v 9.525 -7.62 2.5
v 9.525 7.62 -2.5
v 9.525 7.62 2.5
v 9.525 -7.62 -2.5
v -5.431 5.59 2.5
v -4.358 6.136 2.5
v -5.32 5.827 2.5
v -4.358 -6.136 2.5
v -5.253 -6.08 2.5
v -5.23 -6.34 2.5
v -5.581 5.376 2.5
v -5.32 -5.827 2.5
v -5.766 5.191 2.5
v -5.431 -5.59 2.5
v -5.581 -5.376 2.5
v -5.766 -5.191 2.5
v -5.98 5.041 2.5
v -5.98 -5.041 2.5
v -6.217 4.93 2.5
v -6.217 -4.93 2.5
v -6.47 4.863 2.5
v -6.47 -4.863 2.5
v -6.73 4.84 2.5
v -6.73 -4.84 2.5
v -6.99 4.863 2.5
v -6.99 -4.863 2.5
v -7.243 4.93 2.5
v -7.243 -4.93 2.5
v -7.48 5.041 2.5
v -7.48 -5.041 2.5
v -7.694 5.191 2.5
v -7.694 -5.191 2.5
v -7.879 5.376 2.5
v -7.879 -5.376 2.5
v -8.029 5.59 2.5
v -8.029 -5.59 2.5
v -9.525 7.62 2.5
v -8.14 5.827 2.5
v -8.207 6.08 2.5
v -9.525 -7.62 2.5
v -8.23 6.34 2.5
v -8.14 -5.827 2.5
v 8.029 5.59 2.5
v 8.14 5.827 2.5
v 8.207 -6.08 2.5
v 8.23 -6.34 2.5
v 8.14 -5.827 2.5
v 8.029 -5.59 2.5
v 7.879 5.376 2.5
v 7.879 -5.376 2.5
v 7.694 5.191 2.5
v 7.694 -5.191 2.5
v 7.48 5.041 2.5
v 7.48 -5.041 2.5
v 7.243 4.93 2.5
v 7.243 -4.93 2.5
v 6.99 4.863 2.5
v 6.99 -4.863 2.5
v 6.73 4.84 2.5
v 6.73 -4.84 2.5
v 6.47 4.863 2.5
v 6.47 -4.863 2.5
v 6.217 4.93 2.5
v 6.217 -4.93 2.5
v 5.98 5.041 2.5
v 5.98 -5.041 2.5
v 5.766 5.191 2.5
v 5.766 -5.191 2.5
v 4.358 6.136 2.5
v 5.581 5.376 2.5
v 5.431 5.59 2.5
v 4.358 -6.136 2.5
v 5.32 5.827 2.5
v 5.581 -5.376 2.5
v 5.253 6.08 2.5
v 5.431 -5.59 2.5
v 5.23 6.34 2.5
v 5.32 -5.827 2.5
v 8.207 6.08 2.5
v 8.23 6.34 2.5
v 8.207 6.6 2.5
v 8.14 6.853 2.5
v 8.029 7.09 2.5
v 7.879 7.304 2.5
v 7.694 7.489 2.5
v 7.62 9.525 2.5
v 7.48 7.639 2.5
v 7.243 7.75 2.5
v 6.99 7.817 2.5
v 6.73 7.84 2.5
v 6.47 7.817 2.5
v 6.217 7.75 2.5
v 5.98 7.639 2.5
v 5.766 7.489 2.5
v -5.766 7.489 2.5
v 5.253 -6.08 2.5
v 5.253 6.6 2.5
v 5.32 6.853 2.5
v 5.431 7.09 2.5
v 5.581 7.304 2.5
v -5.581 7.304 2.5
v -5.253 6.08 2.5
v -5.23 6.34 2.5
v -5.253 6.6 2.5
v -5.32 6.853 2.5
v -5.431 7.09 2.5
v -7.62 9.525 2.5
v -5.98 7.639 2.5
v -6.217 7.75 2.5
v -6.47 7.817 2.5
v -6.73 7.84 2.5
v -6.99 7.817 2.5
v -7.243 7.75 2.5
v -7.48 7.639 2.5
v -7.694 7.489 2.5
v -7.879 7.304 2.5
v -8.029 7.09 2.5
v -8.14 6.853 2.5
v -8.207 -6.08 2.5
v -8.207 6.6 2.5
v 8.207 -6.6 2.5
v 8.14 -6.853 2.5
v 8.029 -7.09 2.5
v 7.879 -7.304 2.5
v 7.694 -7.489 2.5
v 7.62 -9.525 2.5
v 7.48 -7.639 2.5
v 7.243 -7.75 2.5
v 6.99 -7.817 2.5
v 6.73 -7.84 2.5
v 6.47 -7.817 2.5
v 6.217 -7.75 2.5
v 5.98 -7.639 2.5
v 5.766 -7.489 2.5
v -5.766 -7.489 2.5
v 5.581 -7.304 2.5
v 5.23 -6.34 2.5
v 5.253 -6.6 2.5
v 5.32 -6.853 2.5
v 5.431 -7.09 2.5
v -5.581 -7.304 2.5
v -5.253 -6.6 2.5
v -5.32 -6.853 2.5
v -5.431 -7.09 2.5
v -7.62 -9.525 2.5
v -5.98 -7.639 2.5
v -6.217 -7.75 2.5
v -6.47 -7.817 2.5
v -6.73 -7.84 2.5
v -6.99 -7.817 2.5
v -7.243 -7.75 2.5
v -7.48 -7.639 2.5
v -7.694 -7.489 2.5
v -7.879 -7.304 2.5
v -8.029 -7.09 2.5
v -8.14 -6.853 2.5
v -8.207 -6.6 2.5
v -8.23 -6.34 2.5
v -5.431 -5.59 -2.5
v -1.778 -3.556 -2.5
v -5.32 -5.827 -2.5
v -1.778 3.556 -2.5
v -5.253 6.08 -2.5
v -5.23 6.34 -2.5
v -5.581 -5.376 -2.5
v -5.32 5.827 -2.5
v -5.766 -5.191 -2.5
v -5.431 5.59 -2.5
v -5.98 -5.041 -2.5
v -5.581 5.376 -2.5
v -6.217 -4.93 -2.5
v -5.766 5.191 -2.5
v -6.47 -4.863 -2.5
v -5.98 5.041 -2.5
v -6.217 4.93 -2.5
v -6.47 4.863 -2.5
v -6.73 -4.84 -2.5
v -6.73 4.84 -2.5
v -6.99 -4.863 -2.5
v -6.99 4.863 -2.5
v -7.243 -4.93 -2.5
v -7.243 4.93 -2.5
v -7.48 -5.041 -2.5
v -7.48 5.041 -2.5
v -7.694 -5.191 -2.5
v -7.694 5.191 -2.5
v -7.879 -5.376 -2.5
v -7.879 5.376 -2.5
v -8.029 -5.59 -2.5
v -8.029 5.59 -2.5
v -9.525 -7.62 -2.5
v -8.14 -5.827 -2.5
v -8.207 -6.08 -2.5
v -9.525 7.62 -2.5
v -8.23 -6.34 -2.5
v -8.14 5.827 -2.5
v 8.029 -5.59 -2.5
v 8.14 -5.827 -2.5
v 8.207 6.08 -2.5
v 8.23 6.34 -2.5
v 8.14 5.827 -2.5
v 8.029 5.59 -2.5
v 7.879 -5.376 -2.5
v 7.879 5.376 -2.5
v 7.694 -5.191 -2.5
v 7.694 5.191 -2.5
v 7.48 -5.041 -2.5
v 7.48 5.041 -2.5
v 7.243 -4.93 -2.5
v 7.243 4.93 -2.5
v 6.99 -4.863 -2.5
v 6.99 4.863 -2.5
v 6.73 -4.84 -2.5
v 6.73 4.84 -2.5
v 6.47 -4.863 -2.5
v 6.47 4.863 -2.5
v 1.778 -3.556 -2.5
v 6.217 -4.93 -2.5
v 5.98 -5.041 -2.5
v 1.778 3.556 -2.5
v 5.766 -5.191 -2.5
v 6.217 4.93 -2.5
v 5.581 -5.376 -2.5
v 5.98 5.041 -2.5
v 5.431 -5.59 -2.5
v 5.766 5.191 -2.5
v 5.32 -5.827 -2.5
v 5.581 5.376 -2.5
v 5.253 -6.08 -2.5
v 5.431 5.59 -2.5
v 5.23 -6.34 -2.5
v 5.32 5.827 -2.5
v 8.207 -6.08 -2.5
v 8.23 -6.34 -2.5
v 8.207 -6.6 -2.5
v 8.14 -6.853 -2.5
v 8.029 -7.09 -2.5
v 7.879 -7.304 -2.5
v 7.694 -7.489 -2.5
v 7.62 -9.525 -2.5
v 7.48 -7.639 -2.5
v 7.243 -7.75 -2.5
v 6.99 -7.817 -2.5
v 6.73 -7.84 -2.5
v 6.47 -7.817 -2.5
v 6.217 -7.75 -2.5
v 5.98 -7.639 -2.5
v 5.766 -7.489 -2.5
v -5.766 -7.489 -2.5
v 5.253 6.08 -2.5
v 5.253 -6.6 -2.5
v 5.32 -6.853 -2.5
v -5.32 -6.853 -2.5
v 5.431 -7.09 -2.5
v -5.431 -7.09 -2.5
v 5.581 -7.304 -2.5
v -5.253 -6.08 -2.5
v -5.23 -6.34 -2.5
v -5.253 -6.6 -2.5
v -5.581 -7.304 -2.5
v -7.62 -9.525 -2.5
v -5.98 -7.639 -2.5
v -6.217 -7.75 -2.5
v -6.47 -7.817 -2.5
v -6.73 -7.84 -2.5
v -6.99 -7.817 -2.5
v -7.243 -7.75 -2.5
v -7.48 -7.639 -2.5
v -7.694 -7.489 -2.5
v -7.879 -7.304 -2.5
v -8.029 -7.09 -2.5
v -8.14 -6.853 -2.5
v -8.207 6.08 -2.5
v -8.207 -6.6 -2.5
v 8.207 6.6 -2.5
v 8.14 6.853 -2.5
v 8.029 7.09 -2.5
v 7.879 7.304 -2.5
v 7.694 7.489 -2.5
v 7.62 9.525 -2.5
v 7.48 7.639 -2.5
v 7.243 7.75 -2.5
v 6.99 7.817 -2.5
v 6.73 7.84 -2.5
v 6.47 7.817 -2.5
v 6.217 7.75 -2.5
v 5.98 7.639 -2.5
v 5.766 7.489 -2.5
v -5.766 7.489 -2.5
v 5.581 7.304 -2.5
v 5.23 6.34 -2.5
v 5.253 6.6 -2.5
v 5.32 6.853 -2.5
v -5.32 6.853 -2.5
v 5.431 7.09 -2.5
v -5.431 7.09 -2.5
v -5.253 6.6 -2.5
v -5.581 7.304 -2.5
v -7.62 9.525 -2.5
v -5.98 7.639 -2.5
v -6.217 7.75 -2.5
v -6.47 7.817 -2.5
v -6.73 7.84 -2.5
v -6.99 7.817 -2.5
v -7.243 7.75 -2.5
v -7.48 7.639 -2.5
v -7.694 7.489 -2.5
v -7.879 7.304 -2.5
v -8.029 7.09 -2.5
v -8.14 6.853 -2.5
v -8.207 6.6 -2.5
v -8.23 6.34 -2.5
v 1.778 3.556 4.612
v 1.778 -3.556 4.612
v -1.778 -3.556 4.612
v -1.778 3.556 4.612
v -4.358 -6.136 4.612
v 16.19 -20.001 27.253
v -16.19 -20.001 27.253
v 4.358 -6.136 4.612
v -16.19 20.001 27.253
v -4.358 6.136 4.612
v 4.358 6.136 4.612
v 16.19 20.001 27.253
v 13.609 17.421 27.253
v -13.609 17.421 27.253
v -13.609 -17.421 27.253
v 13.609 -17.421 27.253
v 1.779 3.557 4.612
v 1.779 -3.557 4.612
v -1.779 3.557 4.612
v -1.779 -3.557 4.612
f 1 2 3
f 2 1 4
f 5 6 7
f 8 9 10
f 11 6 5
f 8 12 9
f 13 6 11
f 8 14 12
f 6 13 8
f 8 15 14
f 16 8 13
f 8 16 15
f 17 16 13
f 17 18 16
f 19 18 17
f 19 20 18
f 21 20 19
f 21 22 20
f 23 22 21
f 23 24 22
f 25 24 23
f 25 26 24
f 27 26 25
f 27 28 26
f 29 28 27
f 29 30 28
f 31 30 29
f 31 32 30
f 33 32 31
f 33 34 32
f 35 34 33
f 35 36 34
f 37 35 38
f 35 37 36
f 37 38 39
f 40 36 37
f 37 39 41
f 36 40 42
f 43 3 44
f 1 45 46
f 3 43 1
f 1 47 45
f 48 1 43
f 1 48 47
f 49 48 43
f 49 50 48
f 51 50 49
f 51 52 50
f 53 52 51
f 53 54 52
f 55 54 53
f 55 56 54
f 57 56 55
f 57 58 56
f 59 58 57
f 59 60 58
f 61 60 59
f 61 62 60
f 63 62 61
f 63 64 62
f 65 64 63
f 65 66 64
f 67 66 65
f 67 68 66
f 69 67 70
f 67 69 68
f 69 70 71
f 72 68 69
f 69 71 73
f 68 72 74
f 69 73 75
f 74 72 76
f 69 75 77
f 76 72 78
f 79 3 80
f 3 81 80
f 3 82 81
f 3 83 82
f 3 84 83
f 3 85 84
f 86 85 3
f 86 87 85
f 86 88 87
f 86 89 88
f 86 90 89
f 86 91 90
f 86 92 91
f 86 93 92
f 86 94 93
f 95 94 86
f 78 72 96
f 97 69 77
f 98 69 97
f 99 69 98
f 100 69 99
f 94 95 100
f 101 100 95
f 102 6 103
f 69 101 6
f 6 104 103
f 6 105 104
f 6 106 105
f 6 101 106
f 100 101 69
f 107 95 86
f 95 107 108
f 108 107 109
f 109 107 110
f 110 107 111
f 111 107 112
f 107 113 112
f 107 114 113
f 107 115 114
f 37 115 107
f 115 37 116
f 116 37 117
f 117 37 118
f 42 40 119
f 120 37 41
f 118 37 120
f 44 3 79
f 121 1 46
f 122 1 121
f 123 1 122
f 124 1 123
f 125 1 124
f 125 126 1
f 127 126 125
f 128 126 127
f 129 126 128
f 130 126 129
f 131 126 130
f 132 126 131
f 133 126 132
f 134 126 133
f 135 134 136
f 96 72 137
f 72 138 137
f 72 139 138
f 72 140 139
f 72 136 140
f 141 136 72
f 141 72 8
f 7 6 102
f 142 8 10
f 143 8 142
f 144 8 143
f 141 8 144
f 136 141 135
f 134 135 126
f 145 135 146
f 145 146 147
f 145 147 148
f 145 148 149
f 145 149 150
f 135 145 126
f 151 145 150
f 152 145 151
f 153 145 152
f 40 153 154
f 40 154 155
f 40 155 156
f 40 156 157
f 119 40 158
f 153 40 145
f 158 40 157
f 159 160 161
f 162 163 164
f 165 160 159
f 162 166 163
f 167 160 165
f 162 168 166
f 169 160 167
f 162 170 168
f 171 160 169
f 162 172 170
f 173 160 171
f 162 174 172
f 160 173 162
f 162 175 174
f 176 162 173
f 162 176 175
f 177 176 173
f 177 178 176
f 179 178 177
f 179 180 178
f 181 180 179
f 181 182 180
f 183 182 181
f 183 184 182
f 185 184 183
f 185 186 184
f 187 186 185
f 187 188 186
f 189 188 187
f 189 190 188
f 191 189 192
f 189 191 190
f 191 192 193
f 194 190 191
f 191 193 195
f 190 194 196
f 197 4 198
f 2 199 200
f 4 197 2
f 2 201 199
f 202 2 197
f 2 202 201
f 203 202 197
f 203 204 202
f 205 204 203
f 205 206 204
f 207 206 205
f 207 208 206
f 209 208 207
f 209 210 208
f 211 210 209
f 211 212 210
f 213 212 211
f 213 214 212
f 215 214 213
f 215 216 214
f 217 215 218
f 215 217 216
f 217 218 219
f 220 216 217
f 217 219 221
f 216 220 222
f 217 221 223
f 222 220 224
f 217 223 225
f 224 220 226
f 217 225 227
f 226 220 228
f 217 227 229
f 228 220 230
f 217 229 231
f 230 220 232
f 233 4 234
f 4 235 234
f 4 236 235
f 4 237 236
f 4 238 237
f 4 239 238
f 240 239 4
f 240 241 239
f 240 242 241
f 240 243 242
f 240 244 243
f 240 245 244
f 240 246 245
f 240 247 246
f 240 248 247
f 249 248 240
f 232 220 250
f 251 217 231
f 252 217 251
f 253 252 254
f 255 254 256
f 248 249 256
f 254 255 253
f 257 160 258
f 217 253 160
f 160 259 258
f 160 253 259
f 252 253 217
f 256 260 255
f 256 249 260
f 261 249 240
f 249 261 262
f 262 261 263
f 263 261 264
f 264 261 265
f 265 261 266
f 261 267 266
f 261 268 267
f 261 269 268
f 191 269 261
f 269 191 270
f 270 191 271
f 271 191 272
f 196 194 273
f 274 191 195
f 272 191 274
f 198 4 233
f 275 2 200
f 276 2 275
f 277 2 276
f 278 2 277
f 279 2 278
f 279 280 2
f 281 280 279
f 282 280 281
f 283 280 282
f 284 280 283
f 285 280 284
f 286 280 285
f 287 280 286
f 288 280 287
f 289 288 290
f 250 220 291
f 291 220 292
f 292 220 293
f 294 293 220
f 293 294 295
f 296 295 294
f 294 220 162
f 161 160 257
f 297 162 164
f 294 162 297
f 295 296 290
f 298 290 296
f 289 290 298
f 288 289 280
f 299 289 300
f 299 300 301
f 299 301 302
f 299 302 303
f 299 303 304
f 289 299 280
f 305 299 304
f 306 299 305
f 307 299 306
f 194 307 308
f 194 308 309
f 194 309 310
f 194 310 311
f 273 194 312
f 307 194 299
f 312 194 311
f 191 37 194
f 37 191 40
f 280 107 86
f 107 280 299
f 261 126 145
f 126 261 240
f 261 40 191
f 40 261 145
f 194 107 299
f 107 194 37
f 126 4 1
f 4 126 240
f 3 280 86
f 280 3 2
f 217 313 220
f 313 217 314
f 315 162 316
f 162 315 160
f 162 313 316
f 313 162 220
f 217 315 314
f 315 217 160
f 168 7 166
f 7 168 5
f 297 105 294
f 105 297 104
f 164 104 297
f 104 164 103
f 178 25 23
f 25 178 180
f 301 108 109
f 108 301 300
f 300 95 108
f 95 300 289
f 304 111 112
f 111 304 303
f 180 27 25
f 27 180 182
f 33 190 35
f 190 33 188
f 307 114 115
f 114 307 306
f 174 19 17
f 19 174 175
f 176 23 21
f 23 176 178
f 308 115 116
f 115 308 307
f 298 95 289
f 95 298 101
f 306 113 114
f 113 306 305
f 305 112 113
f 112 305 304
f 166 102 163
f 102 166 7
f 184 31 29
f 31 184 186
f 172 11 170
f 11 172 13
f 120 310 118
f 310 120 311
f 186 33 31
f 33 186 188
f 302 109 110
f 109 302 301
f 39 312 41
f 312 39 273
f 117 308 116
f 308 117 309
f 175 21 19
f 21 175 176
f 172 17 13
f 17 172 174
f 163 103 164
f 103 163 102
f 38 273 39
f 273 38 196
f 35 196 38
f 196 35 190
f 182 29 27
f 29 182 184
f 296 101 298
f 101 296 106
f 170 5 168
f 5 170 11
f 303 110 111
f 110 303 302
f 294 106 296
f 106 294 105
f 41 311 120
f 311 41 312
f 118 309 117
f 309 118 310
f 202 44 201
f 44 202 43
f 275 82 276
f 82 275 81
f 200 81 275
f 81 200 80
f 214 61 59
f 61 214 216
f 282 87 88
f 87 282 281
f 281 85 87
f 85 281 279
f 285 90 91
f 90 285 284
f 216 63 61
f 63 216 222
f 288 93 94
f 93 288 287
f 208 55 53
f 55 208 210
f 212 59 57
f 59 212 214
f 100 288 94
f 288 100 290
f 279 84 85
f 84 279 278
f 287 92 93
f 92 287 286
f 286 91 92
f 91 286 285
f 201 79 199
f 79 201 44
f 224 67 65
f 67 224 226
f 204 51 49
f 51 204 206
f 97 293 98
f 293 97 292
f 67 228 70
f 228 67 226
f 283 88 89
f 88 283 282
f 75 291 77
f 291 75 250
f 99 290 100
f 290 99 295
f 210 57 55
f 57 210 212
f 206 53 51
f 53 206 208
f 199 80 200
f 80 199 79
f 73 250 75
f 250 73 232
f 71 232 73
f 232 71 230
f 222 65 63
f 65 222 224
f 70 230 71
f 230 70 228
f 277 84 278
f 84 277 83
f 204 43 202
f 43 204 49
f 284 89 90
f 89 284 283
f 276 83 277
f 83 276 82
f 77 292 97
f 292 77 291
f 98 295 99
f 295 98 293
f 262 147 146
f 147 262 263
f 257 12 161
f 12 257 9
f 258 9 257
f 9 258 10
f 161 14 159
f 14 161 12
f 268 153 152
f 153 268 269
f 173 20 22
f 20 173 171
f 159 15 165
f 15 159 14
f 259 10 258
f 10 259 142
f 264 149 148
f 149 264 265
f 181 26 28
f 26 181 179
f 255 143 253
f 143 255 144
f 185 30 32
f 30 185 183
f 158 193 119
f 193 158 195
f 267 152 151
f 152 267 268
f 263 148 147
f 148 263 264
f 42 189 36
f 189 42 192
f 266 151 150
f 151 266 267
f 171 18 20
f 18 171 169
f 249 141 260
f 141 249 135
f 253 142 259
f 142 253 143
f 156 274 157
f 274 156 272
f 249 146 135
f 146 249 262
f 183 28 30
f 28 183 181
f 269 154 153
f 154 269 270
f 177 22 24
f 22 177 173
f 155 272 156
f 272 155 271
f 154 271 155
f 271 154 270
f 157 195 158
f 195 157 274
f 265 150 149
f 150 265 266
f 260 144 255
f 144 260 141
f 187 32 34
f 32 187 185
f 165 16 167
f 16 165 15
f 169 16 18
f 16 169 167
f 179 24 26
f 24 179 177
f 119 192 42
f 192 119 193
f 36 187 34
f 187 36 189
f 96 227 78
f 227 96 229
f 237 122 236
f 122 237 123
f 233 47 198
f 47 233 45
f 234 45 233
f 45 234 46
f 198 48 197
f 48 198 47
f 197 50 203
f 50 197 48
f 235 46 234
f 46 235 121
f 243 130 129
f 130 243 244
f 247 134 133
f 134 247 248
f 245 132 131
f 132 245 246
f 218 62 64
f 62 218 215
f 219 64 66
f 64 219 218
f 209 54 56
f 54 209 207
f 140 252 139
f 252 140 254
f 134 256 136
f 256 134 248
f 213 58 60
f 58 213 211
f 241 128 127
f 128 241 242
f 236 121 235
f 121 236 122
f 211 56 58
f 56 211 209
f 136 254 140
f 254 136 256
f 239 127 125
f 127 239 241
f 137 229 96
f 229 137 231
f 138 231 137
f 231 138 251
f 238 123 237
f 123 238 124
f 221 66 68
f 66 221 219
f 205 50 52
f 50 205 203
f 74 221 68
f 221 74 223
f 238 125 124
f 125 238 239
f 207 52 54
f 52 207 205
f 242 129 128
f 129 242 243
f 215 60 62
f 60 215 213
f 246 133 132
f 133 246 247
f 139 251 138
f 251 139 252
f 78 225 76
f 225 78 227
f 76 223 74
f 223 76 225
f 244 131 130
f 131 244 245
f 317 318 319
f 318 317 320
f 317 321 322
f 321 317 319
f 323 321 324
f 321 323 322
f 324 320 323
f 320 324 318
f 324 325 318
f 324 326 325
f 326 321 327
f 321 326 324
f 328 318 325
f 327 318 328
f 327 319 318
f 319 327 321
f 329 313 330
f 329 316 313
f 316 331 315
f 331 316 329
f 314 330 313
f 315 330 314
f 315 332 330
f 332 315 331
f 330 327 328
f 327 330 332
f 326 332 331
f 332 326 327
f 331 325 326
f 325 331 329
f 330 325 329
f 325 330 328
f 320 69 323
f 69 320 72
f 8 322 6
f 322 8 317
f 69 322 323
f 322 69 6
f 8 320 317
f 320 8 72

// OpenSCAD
// *************************************************************
// (C) 2013 Dipl.Ing. Rolf-Dieter Klein, Munich Germany
// OpenSource -- would be great to keep my name as reference
// HORN ANTENNA for Microwaves -- use copper to metallize
// or use for metal casting !!
// www.rdklein.de
// report error, problems to rdklein@rdklein.de
// *************************************************************
// WR Flange Code 
wrcode = 8; // [1:WR112,2:WR90,3:WR75,4:WR62,5:WR51,6:WR42,7:WR34,8:WR28]
//
// overall wall thickness in mm
wall = 2.58; // 
// flange thickness
flanged = 5; // flange thickness
//
// Antennalenght multiplier R0 = Lambda * n
multin = 2; // default 2Lambda

// addon in lamba/2 units flanged is subtracted ! !
waveadd = 1;  

// standard dimension tables
// WR cannot be entered directly due to openscad variable restrictions
// a case of if for assignment cannot be used, index is easier for this.
// WR 112 7.05-10.00 GHz
// WR 90  8.20-12.40 GHz
// WR 75  10.00-15.00 GHz
// WR 62  12.49-18.00 GHz
// WR 51  15.00-22.00 GHz
// WR 42  18.00-26.50 GHz
// WR 34  22.00-33.00 GHz
// WR 28  26.50-40.00 GHz
//
// do not change:
wrtab = [0,112,90,75,62,51,42,34,28]*1.0;
// do not change:
atab = [0,47.9,41.4,38.3,33.3,31.0,22.41,22.1,19.05]*1.0;
// do not change:
etab = [0,18.72,16.26,14.25,12.14,11.25,8.51,7.9,6.73]*1.0;
// do not change:
ftab = [0,17.17,15.49,13.21,12.63,10.29,8.13,7.5,6.34]*1.0;
// do not change:
drilltab=[0,4.3,4.3,4.1,4.1,4.1,3.1,3.1,3.0]*1.0;
// dann werte zuweisen
// ueber index
sizea = atab[wrcode]; // square size of flange
sizee = etab[wrcode]; // holes from smaller 
sizef = ftab[wrcode]; // holes from larger 
drill = drilltab[wrcode]/2.0; // drill for flange mounting
wr = wrtab[wrcode];
lquat = wr/20.0*2.54; // lamba 4 in mm
//

// faces for precision
$fn=36; // faces for precision
//
// *********** FLANGE ****************
// Draw A Flange with mounting holes
// now with separate thickness.
difference() {
 difference() {
 	intersection() {

		cube([sizea,sizea,flanged],center=true);
		rotate([0,0,45]) cube([sizea*1.4142*0.9,sizea*1.4142*0.9,flanged],center=true);
	}
	cube([lquat,lquat*2,wall*2],center=true);
 } 
 translate([-sizee,sizef,0]) cylinder(h=flanged*2,r=drill,center=true);
 translate([sizee,sizef,0]) cylinder(h=flanged*2,r=drill,center=true);
 translate([-sizee,-sizef,0]) cylinder(h=flanged*2,r=drill,center=true);
 translate([sizee,-sizef,0]) cylinder(h=flanged*2,r=drill,center=true);
}
//
// ***** HORN ANTENNA *****
// Pyramidal Horn
// r0 = length to pyramidal joint point
//
r0 = multin * lquat * 4; // lambda * 4 * multiplier for r0
Asize = sqrt(3*lquat*4*r0); // Size in H plane direction
//
// *** if preferred Bsize = sqrt(2*lquat*4*r0); // Size in E plane direction
//
a = lquat*2; // simpler for calc below
b = lquat;
// ********* rh and re now the base... one can be choosen
// optimal horn is for re=rh
// 
Bsize = 1/2*(b + sqrt(b*b+(8*Asize*(Asize-a)/3) ));
//
echo(r0);
echo(Asize);
//
lh = sqrt(r0*r0+(Asize*Asize)/4);
rh = Asize*( (Asize- a)/(3*lquat*4));

// rh = (Asize- a)*sqrt((lh/Asize)-1/4);
// le = sqrt(r0*r0+(Bsize*Bsize)/4);
// re = (Bsize- b)*sqrt((le/Bsize)-1/4);
// 
 
rh1 = rh * 1.00001; // for boolean problems to be solved
offset1 = -0.001+0.0;

// 
wa1= wall;
// wall thickness not alongside, but if needed:
// alpha = atan(Asize/(2*r0));
// wa1 = wall/cos(alpha);
// echo("alpha",alpha,"walpha=",wa1);
//
// Outer Polygon
 difference() {
translate([0,0,-flanged/2+lquat*2*waveadd]) polyhedron(
  points=[ [Bsize/2+wa1,Asize/2+wa1,rh],[Bsize/2+wa1,-Asize/2-wa1,rh],[-Bsize/2-wa1,-Asize/2-wa1,rh],[-Bsize/2-wa1,Asize/2+wa1,rh], /// the four points at base
           [b/2+wa1,wa1+a/2,0],[b/2+wa1,-wa1-a/2,0],[-wa1-b/2,-wa1-a/2,0],[-wa1-b/2,wa1+a/2,0]  ],                                 // the apex point 
  triangles=[ [0,1,4],[1,2,5],[2,3,6],[3,0,7],          // each triangle side
				   [1,5,4],[2,6,5],[3,7,6],[0,4,7],
              [1,0,3],[2,1,3],[4,5,7],[5,6,7]  ]                         // two triangles for square base
 );
// b in x a in y
// inner polygon for subtration...

translate([0,0,-flanged/2+lquat*2*waveadd]) polyhedron(
  points=[ [Bsize/2,Asize/2,rh1],[Bsize/2,-Asize/2,rh1],[-Bsize/2,-Asize/2,rh1],[-Bsize/2,Asize/2,rh1], /// the four points at base
           [b/2,a/2,offset1],[b/2,-a/2,offset1],[-b/2,-a/2,offset1],[-b/2,a/2,offset1]  ],                                 // the apex point 
  triangles=[ [0,1,4],[1,2,5],[2,3,6],[3,0,7],          // each triangle side
				   [1,5,4],[2,6,5],[3,7,6],[0,4,7],
              [1,0,3],[2,1,3],[4,5,7],[5,6,7]  ]                         // two triangles for square
);
}
// Additional wavequide 
difference() {
 translate([0,0,-flanged/2+lquat*waveadd]) cube([lquat+wall*2,lquat*2+wall*2,lquat*2*waveadd],center=true);
 translate([0,0,-flanged/2+lquat*waveadd]) cube([lquat,lquat*2,lquat*2*waveadd+wall*3],center=true);
}
//


 
